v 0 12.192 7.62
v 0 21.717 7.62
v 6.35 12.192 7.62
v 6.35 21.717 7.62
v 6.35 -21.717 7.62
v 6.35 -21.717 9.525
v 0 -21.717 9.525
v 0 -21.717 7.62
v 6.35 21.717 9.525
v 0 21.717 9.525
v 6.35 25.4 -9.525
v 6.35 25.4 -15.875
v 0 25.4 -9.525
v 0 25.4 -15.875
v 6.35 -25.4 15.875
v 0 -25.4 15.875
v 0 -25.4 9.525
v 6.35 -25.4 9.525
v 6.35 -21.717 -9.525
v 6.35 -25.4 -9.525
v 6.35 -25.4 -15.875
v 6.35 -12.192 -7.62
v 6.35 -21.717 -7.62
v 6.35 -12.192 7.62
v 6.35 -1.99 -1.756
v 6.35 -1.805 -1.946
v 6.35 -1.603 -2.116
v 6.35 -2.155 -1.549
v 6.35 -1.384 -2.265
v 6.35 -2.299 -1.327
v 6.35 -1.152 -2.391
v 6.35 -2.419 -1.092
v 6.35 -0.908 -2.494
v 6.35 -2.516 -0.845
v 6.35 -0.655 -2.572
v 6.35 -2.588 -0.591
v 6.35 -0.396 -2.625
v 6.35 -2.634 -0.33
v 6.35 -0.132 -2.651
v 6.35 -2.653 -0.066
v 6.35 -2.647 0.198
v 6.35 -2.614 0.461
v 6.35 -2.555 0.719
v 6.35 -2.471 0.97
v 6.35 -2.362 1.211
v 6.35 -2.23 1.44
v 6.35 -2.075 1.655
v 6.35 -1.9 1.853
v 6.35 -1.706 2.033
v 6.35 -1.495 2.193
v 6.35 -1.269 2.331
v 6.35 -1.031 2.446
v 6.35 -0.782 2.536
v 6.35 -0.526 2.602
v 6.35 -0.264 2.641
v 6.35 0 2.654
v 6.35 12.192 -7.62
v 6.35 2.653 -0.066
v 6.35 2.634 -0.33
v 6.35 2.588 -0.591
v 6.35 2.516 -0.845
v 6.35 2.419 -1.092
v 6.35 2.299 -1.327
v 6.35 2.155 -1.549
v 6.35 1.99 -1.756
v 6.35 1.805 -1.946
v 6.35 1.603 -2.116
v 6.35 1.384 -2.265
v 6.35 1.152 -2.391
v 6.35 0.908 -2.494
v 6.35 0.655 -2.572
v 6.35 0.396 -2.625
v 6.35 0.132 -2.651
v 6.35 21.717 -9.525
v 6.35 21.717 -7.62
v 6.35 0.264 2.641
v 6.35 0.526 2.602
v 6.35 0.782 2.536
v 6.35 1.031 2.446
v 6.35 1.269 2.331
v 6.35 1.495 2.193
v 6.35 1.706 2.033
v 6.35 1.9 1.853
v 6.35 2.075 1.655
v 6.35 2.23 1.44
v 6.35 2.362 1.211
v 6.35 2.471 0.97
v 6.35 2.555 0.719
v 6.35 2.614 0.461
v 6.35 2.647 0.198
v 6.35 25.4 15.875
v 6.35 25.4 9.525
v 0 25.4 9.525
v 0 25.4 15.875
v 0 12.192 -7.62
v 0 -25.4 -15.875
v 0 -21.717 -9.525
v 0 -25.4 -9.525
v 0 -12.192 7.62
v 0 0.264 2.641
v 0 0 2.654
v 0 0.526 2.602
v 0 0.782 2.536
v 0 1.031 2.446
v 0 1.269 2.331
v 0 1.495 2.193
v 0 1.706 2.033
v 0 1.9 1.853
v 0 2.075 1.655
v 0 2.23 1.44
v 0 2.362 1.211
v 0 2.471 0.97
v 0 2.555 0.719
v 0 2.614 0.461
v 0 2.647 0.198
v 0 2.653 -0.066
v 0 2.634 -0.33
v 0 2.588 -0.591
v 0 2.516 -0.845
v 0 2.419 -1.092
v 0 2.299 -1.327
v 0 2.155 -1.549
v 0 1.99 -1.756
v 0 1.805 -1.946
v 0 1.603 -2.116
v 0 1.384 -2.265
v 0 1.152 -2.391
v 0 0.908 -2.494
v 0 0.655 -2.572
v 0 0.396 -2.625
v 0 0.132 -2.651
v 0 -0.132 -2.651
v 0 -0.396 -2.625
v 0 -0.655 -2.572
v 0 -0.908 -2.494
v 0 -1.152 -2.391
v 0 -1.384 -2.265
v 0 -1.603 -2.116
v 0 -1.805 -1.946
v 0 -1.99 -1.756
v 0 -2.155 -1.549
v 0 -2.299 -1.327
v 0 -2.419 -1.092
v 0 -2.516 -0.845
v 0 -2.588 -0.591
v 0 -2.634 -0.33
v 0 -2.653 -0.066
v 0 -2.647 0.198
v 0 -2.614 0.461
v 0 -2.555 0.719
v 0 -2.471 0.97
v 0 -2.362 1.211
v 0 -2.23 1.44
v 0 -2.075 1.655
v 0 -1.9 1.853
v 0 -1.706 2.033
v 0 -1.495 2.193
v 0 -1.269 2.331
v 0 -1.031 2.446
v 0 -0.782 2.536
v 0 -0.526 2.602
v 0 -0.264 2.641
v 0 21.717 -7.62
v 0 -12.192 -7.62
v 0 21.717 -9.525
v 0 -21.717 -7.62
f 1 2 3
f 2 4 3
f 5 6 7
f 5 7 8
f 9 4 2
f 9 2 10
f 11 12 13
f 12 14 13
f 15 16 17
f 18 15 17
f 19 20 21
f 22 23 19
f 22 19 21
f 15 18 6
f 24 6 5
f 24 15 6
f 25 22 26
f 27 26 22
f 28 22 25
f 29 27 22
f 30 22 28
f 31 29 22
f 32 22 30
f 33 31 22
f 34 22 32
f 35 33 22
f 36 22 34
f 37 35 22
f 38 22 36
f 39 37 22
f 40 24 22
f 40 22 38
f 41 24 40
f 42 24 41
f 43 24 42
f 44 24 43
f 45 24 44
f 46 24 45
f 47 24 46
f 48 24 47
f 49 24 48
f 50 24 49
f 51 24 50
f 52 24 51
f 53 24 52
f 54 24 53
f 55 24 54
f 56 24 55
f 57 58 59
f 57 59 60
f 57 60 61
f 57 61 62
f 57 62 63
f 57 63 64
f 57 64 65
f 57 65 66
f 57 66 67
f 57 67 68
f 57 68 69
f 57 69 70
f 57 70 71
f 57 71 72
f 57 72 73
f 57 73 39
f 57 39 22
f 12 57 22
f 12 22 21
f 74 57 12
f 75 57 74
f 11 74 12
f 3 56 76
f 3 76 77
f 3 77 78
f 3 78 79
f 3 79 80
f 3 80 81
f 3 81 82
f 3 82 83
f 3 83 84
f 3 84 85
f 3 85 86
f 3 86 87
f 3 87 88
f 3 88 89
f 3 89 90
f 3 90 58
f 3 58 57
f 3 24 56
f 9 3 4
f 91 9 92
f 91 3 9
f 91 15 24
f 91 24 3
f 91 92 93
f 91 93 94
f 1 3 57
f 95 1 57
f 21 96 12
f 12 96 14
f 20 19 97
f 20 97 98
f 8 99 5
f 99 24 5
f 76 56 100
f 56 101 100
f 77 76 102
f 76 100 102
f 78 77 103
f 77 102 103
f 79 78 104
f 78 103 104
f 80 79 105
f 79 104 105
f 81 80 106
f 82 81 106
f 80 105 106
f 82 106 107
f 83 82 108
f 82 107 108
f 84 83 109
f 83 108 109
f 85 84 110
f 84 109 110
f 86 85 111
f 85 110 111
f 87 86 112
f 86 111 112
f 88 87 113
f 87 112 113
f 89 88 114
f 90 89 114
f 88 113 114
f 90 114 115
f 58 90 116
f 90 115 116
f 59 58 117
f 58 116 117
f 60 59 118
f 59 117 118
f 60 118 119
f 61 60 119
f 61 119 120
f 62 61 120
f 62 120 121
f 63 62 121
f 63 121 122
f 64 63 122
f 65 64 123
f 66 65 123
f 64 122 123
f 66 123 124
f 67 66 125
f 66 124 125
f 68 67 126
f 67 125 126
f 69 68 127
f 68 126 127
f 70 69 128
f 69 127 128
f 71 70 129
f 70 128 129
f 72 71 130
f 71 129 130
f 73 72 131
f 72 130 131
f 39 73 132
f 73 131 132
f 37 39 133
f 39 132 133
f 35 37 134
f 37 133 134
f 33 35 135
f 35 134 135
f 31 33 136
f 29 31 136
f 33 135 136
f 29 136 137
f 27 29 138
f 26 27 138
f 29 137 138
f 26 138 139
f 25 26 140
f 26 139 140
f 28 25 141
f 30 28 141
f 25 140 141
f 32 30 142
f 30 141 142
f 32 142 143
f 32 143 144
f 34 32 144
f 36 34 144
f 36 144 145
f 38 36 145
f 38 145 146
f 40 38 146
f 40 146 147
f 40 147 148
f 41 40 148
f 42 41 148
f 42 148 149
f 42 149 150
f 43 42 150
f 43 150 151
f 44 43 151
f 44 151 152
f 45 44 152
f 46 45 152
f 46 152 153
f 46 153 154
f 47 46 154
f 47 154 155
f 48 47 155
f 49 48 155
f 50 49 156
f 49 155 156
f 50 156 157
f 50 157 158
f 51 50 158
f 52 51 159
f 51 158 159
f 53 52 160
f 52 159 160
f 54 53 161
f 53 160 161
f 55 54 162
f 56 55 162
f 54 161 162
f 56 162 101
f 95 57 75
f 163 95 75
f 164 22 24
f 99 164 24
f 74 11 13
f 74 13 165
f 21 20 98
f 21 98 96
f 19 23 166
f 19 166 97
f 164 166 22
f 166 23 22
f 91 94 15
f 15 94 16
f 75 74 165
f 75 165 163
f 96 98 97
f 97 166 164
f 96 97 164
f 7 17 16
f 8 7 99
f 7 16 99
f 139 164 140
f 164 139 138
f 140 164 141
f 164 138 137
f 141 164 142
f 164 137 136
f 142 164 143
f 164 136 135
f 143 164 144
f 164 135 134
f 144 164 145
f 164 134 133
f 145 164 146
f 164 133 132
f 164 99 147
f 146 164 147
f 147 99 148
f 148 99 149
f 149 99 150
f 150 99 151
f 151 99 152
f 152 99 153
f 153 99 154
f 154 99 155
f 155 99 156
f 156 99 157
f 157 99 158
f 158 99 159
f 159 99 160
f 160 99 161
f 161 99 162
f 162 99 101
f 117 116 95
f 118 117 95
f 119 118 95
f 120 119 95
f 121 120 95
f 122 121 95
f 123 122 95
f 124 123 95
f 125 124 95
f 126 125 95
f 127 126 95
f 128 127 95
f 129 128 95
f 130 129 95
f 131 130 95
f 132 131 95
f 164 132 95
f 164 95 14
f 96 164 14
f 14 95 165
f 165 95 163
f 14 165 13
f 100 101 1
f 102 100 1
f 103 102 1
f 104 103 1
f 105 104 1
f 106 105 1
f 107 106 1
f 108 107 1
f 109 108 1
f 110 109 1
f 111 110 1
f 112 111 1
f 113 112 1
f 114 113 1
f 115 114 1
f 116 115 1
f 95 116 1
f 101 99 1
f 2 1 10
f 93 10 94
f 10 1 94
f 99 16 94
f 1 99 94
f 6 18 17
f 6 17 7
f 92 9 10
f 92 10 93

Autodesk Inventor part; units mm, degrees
ref_plane "YZ Plane" through (0, 0, 0) normal (1, 0, 0) x (0, 1, 0)
ref_plane "XY Plane" through (0, 0, 0) normal (0, 0, 1) x (1, 0, 0)
sketch "Sketch4" plane through (0, 0, 0) normal (1, 0, 0) x (0, 1, 0)
  line L0 (-25.4, 15.875) -> (-25.4, -15.875)
  line L1 (-25.4, -15.875) -> (25.4, -15.875)
  line L2 (25.4, -15.875) -> (25.4, 15.875)
  line L3 (25.4, 15.875) -> (-25.4, 15.875)
  line L4 (-25.4, 15.875) -> (25.4, -15.875) construction
  line L5 (-25.4, -15.875) -> (25.4, 15.875) construction
  point P0 (0, 0)
  dimension "d11" = 50.8
  dimension "d12" = 31.75
extrude "Extrusion4" add sketch "Sketch4" along normal blind 6.35
sketch "Sketch5" plane through (0, 0, 0) normal (-1, 0, 0) x (0, 0, 1)
  circle A0 centre (0, 0) radius 2.6543
  dimension "d15" = 5.3086
extrude "Extrusion5" cut sketch "Sketch5" against normal through all
sketch "Sketch7" plane through (6.35, 0, 0) normal (1, 0, 0) x (0, 0, -1)
  line L0 (15.875, 25.4) -> (-15.875, 25.4) projected
  line L1 (-9.525, 25.4) -> (9.525, 25.4)
  line L2 (9.525, 25.4) -> (9.525, 21.717)
  line L3 (9.525, 21.717) -> (-9.525, 21.717)
  line L4 (-9.525, 21.717) -> (-9.525, 25.4)
  line L5 (-15.875, 25.4) -> (-15.875, -25.4) projected
  point P0 (0, 0)
  dimension "d25" = 19.05
  dimension "d26" = 6.35
  dimension "d27" = 3.683
extrude "Extrusion7" cut sketch "Sketch7" against normal through all
mirror "Mirror2" about plane through (0, 0, 0) normal (0, 1, 0) of "Extrusion7"
sketch "Sketch8" plane through (6.35, 0, 0) normal (1, 0, 0) x (0, 0, -1)
  line L0 (0, 12.192) -> (7.62, 12.192)
  line L1 (7.62, 12.192) -> (7.62, 21.717)
  line L2 (7.62, 21.717) -> (-7.62, 21.717)
  line L3 (-7.62, 21.717) -> (-7.62, 12.192)
  line L4 (-7.62, 12.192) -> (0, 12.192)
  line L5 (9.525, 21.717) -> (-9.525, 21.717) projected
  point P0 (0, 0)
  dimension "d30" = 9.525
  dimension "d32" = 7.62
  dimension "d33" = 7.62
extrude "Extrusion8" cut sketch "Sketch8" against normal through all
mirror "Mirror3" about plane through (0, 0, 0) normal (0, 1, 0) of "Extrusion8"
equation "\"d11\" = pushPlateLength"
equation "\"d12\" = pushPlateWidth"
equation "\"stopMechanismWidth\" = 50.8"
equation "\"materialThickness\" = 3.175"
equation "\"stopMechanismLength\" = 50.8"
equation "\"stopMEchamismHeight\" = 50.8"
equation "\"stopMechanismHoleForPost\" = 9.525"
equation "\"pushPlateLength\" = 50.8"
equation "\"pushPlateWidth\" = 31.75"
equation "\"slotWidth\" = 12.7"
equation "\"slotDepth\" = 9.525"
properties part number "StopMechanismPushPlate" material "Aluminum 6061"
